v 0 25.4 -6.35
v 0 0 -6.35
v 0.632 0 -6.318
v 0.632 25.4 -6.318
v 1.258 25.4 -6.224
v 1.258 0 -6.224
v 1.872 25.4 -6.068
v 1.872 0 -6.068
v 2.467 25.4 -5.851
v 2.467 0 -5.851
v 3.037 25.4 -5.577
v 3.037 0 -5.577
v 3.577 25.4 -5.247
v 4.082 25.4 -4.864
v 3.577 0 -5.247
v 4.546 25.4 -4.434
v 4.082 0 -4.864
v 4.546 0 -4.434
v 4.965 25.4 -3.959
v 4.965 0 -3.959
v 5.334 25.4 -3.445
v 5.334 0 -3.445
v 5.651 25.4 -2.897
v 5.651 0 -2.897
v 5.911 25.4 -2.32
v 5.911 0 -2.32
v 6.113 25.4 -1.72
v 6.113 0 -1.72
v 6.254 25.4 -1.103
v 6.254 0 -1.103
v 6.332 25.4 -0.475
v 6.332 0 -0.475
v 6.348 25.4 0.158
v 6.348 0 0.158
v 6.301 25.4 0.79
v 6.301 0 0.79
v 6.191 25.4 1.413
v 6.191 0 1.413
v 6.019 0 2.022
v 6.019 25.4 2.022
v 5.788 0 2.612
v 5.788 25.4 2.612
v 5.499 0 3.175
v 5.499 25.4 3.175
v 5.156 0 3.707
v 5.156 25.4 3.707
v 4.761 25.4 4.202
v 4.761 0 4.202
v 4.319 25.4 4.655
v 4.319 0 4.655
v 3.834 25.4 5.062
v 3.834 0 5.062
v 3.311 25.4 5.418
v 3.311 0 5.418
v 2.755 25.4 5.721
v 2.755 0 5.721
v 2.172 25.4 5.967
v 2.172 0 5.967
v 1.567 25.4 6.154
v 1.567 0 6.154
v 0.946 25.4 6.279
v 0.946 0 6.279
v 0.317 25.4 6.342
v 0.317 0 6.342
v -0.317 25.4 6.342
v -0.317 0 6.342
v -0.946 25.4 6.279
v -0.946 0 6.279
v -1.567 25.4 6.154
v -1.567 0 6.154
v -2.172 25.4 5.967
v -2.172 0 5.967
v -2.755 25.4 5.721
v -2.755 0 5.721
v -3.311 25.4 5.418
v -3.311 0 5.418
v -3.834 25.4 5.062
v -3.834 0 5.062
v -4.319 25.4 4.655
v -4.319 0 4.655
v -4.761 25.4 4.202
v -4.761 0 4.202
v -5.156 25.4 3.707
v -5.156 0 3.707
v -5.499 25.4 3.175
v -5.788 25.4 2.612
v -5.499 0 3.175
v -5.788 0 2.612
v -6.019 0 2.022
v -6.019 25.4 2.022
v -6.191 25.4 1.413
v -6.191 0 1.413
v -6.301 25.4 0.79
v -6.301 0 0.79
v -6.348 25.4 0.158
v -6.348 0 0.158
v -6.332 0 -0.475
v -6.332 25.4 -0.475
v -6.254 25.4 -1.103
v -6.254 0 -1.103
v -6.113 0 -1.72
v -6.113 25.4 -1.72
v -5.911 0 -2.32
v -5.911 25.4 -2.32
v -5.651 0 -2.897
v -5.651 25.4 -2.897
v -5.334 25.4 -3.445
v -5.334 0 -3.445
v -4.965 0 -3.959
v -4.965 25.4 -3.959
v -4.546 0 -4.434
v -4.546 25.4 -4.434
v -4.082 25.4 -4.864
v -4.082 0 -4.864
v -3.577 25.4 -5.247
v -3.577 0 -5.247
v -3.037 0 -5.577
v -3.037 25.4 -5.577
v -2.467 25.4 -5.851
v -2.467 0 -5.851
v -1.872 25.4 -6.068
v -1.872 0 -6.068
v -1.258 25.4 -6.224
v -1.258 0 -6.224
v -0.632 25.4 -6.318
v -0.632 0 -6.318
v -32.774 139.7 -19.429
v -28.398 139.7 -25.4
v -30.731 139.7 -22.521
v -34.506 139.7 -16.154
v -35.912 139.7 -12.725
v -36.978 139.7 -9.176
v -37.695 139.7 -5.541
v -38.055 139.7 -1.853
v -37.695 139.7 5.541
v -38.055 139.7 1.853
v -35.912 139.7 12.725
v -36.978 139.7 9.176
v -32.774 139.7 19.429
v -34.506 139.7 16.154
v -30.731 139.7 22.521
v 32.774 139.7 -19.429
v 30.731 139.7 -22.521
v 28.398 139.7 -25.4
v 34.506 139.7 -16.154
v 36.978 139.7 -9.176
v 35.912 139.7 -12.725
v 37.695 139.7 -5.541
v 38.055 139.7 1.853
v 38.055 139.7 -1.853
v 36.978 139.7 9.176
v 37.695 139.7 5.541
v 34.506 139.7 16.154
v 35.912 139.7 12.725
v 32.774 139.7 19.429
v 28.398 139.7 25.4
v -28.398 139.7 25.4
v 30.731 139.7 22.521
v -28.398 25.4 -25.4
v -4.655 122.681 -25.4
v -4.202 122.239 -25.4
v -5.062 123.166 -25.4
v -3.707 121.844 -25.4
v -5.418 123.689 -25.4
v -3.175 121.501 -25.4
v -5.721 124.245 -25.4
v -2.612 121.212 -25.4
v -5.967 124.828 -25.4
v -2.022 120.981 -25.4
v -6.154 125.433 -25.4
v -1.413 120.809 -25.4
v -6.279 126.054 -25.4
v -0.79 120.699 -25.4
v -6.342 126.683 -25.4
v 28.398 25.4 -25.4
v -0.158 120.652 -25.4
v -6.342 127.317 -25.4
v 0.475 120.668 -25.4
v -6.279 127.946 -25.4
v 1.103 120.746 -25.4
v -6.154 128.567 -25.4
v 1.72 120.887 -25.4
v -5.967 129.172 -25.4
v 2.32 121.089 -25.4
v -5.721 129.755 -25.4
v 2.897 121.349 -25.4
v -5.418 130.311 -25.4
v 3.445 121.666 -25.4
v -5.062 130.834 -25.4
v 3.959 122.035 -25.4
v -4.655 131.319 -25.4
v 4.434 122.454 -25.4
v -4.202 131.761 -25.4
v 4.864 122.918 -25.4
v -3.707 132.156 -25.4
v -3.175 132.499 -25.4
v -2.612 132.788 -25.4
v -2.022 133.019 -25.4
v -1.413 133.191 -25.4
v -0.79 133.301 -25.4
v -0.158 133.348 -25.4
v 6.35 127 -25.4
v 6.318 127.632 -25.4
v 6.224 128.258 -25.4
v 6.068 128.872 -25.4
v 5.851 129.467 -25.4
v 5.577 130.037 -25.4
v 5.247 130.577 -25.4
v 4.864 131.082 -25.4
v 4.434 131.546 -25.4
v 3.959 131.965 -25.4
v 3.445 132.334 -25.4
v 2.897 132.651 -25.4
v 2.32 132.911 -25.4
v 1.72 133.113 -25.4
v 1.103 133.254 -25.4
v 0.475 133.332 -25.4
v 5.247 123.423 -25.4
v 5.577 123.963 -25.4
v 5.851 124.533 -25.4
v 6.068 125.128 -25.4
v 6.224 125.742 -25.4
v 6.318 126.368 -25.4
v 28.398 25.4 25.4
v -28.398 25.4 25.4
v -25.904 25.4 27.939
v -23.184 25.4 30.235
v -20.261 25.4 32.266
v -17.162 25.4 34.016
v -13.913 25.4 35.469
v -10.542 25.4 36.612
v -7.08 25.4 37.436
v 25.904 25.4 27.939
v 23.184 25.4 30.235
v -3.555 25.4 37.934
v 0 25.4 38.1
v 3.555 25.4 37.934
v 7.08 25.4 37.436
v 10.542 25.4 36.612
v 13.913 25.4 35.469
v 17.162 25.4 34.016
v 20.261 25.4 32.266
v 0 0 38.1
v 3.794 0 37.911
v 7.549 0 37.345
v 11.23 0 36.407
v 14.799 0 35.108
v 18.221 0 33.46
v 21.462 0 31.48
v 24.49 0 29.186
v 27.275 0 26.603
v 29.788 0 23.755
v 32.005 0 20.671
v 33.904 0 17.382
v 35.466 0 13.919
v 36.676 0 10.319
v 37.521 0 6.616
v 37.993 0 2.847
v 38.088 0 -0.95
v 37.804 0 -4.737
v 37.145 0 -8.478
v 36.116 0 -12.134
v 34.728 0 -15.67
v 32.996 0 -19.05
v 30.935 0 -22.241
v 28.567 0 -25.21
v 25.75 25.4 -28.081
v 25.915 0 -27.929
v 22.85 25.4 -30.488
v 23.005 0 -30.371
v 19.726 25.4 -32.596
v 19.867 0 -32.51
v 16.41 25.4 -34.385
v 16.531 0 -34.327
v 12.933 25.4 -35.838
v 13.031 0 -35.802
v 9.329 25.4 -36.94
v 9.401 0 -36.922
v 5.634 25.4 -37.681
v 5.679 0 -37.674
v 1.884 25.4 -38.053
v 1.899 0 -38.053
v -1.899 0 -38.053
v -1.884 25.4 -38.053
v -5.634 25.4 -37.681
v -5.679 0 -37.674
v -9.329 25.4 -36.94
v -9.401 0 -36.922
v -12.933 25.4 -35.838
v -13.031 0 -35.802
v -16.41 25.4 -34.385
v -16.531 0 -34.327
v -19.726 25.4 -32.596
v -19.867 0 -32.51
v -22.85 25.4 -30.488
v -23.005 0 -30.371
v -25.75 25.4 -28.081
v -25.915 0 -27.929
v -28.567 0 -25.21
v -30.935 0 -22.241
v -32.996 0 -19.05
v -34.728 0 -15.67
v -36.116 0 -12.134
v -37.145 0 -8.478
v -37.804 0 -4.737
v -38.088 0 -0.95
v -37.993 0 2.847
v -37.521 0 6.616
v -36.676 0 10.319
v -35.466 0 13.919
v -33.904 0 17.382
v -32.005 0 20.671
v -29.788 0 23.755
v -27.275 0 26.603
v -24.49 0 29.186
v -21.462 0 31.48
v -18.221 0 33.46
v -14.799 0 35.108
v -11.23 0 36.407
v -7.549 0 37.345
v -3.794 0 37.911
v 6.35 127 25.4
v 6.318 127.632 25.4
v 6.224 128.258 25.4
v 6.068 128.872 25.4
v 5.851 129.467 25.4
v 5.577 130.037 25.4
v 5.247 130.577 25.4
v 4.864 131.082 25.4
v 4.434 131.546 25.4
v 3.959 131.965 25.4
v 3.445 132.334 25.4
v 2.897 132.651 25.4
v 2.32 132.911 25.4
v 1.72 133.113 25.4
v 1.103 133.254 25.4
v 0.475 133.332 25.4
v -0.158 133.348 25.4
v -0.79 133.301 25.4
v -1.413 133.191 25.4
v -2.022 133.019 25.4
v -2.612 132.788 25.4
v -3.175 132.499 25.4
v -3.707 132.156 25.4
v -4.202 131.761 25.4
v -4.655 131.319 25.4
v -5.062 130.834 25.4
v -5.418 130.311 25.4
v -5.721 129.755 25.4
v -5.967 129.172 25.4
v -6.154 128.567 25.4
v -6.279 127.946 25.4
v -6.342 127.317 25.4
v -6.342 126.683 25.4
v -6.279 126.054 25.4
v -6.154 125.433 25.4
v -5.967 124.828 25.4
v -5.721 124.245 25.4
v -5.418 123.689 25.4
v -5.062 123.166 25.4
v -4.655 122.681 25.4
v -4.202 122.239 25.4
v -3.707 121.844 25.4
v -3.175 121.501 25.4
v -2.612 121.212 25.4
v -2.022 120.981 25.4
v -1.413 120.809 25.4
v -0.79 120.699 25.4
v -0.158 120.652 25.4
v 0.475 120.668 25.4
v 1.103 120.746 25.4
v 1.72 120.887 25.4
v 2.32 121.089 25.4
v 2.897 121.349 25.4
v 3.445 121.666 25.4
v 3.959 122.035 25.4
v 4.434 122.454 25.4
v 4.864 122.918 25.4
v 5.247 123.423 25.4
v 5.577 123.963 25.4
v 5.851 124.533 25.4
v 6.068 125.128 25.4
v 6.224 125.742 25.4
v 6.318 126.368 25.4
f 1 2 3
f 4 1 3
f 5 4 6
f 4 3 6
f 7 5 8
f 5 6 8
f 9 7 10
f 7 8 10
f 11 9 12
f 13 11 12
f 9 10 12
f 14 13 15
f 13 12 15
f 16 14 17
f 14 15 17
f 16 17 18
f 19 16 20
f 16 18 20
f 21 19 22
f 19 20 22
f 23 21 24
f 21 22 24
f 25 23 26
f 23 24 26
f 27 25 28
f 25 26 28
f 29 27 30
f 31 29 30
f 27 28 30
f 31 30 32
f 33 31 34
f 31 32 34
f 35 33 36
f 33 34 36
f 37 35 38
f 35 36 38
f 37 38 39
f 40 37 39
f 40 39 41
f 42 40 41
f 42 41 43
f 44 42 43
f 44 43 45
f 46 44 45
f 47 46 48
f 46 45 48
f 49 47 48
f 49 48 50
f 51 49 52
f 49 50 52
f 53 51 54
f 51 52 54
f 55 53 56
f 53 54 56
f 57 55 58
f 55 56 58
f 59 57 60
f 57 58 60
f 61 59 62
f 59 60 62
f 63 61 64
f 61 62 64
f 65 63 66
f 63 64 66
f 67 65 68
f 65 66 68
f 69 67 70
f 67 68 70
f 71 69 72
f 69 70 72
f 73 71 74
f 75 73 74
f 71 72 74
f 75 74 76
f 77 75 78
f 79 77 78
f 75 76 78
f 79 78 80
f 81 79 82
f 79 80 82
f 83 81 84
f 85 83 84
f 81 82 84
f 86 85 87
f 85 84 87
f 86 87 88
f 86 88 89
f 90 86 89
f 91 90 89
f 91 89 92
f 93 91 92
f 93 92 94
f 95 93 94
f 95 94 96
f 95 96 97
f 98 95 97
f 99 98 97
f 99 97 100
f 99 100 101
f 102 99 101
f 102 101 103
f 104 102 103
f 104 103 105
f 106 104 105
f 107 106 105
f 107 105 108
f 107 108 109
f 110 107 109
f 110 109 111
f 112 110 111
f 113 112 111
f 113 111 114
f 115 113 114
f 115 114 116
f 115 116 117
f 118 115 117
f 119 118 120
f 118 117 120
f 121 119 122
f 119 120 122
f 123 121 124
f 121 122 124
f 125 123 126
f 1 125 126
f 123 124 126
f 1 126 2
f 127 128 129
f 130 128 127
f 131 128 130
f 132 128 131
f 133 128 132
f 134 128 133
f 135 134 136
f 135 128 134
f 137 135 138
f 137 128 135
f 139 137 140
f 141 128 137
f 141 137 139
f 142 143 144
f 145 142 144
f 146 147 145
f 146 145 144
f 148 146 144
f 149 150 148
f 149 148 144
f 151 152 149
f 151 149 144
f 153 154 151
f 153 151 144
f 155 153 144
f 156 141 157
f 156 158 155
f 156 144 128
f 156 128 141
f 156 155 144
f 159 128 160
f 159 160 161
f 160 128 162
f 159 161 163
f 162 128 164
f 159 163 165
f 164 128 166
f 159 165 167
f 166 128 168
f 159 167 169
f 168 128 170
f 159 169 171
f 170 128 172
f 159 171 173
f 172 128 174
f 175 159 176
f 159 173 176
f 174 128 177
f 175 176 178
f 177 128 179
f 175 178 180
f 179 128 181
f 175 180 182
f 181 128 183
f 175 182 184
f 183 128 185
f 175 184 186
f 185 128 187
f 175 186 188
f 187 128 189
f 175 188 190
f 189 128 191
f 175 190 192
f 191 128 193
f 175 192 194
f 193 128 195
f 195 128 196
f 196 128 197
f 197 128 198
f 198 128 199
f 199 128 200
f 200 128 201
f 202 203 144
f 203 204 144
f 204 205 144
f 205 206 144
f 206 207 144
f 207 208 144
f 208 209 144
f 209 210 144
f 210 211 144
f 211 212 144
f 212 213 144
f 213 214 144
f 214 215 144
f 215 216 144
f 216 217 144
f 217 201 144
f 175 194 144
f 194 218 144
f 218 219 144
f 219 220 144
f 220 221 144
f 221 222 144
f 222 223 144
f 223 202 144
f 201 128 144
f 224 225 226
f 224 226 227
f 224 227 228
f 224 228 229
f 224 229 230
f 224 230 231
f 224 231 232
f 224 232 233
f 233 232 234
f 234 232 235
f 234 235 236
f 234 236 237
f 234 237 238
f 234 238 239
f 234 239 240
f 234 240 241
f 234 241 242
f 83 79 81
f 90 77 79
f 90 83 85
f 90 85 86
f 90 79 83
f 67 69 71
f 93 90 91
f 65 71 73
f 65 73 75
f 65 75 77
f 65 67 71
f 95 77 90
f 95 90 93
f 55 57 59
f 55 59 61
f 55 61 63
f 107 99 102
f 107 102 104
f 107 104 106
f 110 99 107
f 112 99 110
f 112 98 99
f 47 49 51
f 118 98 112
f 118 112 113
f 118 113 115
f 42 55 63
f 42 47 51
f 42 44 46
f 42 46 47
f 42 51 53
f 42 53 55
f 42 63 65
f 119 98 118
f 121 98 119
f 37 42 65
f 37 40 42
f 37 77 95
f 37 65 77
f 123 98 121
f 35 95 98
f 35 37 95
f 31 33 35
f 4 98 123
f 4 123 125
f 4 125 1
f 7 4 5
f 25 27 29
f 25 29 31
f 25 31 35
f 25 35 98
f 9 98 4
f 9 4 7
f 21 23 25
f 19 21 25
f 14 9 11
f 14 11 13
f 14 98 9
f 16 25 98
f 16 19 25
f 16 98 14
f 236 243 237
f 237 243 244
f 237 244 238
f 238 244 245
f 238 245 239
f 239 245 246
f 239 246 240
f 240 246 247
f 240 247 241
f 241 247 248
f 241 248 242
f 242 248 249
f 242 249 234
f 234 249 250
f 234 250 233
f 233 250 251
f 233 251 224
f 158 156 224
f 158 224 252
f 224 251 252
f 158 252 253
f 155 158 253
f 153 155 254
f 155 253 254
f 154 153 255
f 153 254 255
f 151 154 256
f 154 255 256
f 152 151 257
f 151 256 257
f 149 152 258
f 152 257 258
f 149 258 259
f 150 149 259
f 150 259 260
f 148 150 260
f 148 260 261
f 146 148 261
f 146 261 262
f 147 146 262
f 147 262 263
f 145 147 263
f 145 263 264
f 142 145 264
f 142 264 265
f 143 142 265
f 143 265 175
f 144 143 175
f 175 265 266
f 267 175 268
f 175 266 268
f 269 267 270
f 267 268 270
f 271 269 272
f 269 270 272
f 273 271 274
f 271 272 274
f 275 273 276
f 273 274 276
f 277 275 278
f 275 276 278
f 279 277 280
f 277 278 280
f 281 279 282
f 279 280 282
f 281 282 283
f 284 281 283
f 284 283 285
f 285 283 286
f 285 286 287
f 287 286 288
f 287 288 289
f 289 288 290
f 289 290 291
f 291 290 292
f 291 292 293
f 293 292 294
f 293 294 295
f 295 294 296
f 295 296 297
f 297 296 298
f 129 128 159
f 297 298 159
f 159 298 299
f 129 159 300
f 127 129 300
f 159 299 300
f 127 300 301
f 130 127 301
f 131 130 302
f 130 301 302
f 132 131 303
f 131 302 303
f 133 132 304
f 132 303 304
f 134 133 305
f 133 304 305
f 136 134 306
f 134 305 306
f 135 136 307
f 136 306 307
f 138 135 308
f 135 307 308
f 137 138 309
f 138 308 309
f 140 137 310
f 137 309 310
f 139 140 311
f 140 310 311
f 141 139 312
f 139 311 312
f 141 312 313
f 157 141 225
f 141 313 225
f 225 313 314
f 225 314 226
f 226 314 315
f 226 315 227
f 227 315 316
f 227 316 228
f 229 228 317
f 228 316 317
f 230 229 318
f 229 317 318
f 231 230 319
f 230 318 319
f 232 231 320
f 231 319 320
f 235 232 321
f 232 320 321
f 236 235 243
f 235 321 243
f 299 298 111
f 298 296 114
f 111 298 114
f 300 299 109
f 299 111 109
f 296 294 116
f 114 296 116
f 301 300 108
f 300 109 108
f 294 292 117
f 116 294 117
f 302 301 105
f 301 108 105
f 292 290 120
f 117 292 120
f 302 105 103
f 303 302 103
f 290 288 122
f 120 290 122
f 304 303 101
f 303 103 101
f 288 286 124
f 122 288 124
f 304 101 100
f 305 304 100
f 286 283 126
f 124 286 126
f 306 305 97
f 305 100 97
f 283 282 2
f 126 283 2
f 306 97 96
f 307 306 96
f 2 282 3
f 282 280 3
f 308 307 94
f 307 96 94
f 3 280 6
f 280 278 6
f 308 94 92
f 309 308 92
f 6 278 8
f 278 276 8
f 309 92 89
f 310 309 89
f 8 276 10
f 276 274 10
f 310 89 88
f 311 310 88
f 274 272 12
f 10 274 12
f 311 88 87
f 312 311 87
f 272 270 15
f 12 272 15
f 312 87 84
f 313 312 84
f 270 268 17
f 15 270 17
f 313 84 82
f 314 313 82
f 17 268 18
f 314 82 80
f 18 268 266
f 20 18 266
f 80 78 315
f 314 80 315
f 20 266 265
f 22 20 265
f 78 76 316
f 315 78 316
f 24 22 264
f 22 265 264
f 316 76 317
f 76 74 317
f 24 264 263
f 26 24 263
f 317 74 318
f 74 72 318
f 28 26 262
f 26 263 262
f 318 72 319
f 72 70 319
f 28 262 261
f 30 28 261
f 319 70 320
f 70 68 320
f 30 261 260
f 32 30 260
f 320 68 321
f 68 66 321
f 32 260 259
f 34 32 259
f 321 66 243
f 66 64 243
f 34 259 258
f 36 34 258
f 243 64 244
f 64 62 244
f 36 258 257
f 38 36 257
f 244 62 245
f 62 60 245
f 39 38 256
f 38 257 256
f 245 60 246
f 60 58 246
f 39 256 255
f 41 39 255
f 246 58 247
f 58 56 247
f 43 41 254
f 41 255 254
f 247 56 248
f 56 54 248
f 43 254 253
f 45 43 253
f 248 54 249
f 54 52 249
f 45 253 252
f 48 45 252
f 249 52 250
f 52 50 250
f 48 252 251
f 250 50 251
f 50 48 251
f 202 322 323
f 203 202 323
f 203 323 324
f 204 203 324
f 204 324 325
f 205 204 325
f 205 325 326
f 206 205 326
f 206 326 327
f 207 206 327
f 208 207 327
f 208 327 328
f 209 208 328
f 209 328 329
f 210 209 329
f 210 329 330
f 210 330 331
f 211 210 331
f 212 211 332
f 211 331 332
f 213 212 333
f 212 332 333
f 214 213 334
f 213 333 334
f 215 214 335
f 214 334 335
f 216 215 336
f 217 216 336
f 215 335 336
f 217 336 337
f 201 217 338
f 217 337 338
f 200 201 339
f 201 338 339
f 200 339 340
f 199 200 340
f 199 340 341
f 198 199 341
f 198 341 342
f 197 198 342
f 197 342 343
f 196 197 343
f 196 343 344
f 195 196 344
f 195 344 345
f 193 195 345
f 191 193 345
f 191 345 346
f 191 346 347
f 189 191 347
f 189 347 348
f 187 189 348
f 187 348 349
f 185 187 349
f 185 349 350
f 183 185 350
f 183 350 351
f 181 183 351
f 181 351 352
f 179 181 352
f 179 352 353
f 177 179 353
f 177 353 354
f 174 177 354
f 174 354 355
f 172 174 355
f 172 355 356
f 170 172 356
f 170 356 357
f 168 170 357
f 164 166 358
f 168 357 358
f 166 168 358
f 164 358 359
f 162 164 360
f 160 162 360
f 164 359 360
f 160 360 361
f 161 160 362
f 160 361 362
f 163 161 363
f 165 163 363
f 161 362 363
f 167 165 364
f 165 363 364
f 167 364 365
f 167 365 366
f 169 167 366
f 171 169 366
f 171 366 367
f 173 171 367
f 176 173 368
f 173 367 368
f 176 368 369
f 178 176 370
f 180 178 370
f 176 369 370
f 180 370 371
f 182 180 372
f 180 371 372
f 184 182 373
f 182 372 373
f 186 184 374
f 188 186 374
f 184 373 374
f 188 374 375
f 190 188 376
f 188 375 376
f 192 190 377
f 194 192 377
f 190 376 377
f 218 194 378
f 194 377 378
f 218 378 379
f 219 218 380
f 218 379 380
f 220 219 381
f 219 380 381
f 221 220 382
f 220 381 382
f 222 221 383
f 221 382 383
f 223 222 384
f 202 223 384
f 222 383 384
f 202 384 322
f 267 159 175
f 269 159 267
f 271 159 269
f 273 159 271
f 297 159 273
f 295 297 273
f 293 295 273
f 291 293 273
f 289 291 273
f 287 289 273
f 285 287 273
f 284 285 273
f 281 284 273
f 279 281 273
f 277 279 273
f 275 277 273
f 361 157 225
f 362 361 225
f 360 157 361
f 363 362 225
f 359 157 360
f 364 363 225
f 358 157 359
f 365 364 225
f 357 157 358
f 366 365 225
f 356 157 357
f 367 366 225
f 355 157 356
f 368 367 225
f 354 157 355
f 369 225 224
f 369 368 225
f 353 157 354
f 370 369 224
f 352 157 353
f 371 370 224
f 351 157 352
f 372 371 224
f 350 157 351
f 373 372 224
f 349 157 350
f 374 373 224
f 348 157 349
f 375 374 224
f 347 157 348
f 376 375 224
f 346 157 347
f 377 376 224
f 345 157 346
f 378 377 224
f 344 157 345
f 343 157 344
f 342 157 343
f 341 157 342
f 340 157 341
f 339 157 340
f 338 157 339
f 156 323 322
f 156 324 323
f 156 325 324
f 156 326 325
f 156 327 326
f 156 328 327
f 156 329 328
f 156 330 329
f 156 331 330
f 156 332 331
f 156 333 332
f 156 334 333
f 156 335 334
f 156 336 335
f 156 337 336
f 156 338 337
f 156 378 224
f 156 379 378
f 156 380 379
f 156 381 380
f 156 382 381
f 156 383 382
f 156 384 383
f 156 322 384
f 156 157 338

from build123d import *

# Parameters (mm, degrees)
SKETCH1_R           = 38.1
BOSS_EXTRUDE1_DEPTH = 139.7
SKETCH2_R           = 6.35
CUT_EXTRUDE1_DEPTH  = 25.4
CUT_EXTRUDE2_START  = 25.4
SKETCH3_W           = 76.2
SKETCH3_H           = 114.3
CUT_EXTRUDE2_DEPTH  = 25.4
CUT_EXTRUDE3_START  = -25.4
SKETCH3_2_W         = 76.2
SKETCH3_2_H         = 114.3
CUT_EXTRUDE3_DEPTH  = 25.4
SKETCH4_R           = 6.35
CUT_EXTRUDE4_DEPTH  = 159.113724894


with BuildPart() as part:
    # Sketch1 → Boss-Extrude1 (new body)
    with BuildSketch(Plane(origin=(0, 0, 0), x_dir=(1, 0, 0), z_dir=(0, 1, 0))):
        Circle(SKETCH1_R)
    extrude(amount=BOSS_EXTRUDE1_DEPTH)

    # Sketch2 → Cut-Extrude1 (cut)
    with BuildSketch(Plane.XZ):
        Circle(SKETCH2_R)
    extrude(amount=-CUT_EXTRUDE1_DEPTH, mode=Mode.SUBTRACT)

    # Sketch3 → Cut-Extrude2 (cut)
    with BuildSketch(Plane.XY.offset(CUT_EXTRUDE2_START)):
        with Locations((0, 82.55)):
            Rectangle(SKETCH3_W, SKETCH3_H)
    extrude(amount=CUT_EXTRUDE2_DEPTH, mode=Mode.SUBTRACT)

    # Sketch3<2> → Cut-Extrude3 (cut)
    with BuildSketch(Plane.XY.offset(CUT_EXTRUDE3_START)):
        with Locations((0, 82.55)):
            Rectangle(SKETCH3_2_W, SKETCH3_2_H)
    extrude(amount=-CUT_EXTRUDE3_DEPTH, mode=Mode.SUBTRACT)

    # Sketch4 → Cut-Extrude4 (cut, through all)
    with BuildSketch(Plane.XY.offset(25.4)):
        with Locations((0, 127)):
            Circle(SKETCH4_R)
    extrude(amount=-CUT_EXTRUDE4_DEPTH, mode=Mode.SUBTRACT)


solid = part.part
